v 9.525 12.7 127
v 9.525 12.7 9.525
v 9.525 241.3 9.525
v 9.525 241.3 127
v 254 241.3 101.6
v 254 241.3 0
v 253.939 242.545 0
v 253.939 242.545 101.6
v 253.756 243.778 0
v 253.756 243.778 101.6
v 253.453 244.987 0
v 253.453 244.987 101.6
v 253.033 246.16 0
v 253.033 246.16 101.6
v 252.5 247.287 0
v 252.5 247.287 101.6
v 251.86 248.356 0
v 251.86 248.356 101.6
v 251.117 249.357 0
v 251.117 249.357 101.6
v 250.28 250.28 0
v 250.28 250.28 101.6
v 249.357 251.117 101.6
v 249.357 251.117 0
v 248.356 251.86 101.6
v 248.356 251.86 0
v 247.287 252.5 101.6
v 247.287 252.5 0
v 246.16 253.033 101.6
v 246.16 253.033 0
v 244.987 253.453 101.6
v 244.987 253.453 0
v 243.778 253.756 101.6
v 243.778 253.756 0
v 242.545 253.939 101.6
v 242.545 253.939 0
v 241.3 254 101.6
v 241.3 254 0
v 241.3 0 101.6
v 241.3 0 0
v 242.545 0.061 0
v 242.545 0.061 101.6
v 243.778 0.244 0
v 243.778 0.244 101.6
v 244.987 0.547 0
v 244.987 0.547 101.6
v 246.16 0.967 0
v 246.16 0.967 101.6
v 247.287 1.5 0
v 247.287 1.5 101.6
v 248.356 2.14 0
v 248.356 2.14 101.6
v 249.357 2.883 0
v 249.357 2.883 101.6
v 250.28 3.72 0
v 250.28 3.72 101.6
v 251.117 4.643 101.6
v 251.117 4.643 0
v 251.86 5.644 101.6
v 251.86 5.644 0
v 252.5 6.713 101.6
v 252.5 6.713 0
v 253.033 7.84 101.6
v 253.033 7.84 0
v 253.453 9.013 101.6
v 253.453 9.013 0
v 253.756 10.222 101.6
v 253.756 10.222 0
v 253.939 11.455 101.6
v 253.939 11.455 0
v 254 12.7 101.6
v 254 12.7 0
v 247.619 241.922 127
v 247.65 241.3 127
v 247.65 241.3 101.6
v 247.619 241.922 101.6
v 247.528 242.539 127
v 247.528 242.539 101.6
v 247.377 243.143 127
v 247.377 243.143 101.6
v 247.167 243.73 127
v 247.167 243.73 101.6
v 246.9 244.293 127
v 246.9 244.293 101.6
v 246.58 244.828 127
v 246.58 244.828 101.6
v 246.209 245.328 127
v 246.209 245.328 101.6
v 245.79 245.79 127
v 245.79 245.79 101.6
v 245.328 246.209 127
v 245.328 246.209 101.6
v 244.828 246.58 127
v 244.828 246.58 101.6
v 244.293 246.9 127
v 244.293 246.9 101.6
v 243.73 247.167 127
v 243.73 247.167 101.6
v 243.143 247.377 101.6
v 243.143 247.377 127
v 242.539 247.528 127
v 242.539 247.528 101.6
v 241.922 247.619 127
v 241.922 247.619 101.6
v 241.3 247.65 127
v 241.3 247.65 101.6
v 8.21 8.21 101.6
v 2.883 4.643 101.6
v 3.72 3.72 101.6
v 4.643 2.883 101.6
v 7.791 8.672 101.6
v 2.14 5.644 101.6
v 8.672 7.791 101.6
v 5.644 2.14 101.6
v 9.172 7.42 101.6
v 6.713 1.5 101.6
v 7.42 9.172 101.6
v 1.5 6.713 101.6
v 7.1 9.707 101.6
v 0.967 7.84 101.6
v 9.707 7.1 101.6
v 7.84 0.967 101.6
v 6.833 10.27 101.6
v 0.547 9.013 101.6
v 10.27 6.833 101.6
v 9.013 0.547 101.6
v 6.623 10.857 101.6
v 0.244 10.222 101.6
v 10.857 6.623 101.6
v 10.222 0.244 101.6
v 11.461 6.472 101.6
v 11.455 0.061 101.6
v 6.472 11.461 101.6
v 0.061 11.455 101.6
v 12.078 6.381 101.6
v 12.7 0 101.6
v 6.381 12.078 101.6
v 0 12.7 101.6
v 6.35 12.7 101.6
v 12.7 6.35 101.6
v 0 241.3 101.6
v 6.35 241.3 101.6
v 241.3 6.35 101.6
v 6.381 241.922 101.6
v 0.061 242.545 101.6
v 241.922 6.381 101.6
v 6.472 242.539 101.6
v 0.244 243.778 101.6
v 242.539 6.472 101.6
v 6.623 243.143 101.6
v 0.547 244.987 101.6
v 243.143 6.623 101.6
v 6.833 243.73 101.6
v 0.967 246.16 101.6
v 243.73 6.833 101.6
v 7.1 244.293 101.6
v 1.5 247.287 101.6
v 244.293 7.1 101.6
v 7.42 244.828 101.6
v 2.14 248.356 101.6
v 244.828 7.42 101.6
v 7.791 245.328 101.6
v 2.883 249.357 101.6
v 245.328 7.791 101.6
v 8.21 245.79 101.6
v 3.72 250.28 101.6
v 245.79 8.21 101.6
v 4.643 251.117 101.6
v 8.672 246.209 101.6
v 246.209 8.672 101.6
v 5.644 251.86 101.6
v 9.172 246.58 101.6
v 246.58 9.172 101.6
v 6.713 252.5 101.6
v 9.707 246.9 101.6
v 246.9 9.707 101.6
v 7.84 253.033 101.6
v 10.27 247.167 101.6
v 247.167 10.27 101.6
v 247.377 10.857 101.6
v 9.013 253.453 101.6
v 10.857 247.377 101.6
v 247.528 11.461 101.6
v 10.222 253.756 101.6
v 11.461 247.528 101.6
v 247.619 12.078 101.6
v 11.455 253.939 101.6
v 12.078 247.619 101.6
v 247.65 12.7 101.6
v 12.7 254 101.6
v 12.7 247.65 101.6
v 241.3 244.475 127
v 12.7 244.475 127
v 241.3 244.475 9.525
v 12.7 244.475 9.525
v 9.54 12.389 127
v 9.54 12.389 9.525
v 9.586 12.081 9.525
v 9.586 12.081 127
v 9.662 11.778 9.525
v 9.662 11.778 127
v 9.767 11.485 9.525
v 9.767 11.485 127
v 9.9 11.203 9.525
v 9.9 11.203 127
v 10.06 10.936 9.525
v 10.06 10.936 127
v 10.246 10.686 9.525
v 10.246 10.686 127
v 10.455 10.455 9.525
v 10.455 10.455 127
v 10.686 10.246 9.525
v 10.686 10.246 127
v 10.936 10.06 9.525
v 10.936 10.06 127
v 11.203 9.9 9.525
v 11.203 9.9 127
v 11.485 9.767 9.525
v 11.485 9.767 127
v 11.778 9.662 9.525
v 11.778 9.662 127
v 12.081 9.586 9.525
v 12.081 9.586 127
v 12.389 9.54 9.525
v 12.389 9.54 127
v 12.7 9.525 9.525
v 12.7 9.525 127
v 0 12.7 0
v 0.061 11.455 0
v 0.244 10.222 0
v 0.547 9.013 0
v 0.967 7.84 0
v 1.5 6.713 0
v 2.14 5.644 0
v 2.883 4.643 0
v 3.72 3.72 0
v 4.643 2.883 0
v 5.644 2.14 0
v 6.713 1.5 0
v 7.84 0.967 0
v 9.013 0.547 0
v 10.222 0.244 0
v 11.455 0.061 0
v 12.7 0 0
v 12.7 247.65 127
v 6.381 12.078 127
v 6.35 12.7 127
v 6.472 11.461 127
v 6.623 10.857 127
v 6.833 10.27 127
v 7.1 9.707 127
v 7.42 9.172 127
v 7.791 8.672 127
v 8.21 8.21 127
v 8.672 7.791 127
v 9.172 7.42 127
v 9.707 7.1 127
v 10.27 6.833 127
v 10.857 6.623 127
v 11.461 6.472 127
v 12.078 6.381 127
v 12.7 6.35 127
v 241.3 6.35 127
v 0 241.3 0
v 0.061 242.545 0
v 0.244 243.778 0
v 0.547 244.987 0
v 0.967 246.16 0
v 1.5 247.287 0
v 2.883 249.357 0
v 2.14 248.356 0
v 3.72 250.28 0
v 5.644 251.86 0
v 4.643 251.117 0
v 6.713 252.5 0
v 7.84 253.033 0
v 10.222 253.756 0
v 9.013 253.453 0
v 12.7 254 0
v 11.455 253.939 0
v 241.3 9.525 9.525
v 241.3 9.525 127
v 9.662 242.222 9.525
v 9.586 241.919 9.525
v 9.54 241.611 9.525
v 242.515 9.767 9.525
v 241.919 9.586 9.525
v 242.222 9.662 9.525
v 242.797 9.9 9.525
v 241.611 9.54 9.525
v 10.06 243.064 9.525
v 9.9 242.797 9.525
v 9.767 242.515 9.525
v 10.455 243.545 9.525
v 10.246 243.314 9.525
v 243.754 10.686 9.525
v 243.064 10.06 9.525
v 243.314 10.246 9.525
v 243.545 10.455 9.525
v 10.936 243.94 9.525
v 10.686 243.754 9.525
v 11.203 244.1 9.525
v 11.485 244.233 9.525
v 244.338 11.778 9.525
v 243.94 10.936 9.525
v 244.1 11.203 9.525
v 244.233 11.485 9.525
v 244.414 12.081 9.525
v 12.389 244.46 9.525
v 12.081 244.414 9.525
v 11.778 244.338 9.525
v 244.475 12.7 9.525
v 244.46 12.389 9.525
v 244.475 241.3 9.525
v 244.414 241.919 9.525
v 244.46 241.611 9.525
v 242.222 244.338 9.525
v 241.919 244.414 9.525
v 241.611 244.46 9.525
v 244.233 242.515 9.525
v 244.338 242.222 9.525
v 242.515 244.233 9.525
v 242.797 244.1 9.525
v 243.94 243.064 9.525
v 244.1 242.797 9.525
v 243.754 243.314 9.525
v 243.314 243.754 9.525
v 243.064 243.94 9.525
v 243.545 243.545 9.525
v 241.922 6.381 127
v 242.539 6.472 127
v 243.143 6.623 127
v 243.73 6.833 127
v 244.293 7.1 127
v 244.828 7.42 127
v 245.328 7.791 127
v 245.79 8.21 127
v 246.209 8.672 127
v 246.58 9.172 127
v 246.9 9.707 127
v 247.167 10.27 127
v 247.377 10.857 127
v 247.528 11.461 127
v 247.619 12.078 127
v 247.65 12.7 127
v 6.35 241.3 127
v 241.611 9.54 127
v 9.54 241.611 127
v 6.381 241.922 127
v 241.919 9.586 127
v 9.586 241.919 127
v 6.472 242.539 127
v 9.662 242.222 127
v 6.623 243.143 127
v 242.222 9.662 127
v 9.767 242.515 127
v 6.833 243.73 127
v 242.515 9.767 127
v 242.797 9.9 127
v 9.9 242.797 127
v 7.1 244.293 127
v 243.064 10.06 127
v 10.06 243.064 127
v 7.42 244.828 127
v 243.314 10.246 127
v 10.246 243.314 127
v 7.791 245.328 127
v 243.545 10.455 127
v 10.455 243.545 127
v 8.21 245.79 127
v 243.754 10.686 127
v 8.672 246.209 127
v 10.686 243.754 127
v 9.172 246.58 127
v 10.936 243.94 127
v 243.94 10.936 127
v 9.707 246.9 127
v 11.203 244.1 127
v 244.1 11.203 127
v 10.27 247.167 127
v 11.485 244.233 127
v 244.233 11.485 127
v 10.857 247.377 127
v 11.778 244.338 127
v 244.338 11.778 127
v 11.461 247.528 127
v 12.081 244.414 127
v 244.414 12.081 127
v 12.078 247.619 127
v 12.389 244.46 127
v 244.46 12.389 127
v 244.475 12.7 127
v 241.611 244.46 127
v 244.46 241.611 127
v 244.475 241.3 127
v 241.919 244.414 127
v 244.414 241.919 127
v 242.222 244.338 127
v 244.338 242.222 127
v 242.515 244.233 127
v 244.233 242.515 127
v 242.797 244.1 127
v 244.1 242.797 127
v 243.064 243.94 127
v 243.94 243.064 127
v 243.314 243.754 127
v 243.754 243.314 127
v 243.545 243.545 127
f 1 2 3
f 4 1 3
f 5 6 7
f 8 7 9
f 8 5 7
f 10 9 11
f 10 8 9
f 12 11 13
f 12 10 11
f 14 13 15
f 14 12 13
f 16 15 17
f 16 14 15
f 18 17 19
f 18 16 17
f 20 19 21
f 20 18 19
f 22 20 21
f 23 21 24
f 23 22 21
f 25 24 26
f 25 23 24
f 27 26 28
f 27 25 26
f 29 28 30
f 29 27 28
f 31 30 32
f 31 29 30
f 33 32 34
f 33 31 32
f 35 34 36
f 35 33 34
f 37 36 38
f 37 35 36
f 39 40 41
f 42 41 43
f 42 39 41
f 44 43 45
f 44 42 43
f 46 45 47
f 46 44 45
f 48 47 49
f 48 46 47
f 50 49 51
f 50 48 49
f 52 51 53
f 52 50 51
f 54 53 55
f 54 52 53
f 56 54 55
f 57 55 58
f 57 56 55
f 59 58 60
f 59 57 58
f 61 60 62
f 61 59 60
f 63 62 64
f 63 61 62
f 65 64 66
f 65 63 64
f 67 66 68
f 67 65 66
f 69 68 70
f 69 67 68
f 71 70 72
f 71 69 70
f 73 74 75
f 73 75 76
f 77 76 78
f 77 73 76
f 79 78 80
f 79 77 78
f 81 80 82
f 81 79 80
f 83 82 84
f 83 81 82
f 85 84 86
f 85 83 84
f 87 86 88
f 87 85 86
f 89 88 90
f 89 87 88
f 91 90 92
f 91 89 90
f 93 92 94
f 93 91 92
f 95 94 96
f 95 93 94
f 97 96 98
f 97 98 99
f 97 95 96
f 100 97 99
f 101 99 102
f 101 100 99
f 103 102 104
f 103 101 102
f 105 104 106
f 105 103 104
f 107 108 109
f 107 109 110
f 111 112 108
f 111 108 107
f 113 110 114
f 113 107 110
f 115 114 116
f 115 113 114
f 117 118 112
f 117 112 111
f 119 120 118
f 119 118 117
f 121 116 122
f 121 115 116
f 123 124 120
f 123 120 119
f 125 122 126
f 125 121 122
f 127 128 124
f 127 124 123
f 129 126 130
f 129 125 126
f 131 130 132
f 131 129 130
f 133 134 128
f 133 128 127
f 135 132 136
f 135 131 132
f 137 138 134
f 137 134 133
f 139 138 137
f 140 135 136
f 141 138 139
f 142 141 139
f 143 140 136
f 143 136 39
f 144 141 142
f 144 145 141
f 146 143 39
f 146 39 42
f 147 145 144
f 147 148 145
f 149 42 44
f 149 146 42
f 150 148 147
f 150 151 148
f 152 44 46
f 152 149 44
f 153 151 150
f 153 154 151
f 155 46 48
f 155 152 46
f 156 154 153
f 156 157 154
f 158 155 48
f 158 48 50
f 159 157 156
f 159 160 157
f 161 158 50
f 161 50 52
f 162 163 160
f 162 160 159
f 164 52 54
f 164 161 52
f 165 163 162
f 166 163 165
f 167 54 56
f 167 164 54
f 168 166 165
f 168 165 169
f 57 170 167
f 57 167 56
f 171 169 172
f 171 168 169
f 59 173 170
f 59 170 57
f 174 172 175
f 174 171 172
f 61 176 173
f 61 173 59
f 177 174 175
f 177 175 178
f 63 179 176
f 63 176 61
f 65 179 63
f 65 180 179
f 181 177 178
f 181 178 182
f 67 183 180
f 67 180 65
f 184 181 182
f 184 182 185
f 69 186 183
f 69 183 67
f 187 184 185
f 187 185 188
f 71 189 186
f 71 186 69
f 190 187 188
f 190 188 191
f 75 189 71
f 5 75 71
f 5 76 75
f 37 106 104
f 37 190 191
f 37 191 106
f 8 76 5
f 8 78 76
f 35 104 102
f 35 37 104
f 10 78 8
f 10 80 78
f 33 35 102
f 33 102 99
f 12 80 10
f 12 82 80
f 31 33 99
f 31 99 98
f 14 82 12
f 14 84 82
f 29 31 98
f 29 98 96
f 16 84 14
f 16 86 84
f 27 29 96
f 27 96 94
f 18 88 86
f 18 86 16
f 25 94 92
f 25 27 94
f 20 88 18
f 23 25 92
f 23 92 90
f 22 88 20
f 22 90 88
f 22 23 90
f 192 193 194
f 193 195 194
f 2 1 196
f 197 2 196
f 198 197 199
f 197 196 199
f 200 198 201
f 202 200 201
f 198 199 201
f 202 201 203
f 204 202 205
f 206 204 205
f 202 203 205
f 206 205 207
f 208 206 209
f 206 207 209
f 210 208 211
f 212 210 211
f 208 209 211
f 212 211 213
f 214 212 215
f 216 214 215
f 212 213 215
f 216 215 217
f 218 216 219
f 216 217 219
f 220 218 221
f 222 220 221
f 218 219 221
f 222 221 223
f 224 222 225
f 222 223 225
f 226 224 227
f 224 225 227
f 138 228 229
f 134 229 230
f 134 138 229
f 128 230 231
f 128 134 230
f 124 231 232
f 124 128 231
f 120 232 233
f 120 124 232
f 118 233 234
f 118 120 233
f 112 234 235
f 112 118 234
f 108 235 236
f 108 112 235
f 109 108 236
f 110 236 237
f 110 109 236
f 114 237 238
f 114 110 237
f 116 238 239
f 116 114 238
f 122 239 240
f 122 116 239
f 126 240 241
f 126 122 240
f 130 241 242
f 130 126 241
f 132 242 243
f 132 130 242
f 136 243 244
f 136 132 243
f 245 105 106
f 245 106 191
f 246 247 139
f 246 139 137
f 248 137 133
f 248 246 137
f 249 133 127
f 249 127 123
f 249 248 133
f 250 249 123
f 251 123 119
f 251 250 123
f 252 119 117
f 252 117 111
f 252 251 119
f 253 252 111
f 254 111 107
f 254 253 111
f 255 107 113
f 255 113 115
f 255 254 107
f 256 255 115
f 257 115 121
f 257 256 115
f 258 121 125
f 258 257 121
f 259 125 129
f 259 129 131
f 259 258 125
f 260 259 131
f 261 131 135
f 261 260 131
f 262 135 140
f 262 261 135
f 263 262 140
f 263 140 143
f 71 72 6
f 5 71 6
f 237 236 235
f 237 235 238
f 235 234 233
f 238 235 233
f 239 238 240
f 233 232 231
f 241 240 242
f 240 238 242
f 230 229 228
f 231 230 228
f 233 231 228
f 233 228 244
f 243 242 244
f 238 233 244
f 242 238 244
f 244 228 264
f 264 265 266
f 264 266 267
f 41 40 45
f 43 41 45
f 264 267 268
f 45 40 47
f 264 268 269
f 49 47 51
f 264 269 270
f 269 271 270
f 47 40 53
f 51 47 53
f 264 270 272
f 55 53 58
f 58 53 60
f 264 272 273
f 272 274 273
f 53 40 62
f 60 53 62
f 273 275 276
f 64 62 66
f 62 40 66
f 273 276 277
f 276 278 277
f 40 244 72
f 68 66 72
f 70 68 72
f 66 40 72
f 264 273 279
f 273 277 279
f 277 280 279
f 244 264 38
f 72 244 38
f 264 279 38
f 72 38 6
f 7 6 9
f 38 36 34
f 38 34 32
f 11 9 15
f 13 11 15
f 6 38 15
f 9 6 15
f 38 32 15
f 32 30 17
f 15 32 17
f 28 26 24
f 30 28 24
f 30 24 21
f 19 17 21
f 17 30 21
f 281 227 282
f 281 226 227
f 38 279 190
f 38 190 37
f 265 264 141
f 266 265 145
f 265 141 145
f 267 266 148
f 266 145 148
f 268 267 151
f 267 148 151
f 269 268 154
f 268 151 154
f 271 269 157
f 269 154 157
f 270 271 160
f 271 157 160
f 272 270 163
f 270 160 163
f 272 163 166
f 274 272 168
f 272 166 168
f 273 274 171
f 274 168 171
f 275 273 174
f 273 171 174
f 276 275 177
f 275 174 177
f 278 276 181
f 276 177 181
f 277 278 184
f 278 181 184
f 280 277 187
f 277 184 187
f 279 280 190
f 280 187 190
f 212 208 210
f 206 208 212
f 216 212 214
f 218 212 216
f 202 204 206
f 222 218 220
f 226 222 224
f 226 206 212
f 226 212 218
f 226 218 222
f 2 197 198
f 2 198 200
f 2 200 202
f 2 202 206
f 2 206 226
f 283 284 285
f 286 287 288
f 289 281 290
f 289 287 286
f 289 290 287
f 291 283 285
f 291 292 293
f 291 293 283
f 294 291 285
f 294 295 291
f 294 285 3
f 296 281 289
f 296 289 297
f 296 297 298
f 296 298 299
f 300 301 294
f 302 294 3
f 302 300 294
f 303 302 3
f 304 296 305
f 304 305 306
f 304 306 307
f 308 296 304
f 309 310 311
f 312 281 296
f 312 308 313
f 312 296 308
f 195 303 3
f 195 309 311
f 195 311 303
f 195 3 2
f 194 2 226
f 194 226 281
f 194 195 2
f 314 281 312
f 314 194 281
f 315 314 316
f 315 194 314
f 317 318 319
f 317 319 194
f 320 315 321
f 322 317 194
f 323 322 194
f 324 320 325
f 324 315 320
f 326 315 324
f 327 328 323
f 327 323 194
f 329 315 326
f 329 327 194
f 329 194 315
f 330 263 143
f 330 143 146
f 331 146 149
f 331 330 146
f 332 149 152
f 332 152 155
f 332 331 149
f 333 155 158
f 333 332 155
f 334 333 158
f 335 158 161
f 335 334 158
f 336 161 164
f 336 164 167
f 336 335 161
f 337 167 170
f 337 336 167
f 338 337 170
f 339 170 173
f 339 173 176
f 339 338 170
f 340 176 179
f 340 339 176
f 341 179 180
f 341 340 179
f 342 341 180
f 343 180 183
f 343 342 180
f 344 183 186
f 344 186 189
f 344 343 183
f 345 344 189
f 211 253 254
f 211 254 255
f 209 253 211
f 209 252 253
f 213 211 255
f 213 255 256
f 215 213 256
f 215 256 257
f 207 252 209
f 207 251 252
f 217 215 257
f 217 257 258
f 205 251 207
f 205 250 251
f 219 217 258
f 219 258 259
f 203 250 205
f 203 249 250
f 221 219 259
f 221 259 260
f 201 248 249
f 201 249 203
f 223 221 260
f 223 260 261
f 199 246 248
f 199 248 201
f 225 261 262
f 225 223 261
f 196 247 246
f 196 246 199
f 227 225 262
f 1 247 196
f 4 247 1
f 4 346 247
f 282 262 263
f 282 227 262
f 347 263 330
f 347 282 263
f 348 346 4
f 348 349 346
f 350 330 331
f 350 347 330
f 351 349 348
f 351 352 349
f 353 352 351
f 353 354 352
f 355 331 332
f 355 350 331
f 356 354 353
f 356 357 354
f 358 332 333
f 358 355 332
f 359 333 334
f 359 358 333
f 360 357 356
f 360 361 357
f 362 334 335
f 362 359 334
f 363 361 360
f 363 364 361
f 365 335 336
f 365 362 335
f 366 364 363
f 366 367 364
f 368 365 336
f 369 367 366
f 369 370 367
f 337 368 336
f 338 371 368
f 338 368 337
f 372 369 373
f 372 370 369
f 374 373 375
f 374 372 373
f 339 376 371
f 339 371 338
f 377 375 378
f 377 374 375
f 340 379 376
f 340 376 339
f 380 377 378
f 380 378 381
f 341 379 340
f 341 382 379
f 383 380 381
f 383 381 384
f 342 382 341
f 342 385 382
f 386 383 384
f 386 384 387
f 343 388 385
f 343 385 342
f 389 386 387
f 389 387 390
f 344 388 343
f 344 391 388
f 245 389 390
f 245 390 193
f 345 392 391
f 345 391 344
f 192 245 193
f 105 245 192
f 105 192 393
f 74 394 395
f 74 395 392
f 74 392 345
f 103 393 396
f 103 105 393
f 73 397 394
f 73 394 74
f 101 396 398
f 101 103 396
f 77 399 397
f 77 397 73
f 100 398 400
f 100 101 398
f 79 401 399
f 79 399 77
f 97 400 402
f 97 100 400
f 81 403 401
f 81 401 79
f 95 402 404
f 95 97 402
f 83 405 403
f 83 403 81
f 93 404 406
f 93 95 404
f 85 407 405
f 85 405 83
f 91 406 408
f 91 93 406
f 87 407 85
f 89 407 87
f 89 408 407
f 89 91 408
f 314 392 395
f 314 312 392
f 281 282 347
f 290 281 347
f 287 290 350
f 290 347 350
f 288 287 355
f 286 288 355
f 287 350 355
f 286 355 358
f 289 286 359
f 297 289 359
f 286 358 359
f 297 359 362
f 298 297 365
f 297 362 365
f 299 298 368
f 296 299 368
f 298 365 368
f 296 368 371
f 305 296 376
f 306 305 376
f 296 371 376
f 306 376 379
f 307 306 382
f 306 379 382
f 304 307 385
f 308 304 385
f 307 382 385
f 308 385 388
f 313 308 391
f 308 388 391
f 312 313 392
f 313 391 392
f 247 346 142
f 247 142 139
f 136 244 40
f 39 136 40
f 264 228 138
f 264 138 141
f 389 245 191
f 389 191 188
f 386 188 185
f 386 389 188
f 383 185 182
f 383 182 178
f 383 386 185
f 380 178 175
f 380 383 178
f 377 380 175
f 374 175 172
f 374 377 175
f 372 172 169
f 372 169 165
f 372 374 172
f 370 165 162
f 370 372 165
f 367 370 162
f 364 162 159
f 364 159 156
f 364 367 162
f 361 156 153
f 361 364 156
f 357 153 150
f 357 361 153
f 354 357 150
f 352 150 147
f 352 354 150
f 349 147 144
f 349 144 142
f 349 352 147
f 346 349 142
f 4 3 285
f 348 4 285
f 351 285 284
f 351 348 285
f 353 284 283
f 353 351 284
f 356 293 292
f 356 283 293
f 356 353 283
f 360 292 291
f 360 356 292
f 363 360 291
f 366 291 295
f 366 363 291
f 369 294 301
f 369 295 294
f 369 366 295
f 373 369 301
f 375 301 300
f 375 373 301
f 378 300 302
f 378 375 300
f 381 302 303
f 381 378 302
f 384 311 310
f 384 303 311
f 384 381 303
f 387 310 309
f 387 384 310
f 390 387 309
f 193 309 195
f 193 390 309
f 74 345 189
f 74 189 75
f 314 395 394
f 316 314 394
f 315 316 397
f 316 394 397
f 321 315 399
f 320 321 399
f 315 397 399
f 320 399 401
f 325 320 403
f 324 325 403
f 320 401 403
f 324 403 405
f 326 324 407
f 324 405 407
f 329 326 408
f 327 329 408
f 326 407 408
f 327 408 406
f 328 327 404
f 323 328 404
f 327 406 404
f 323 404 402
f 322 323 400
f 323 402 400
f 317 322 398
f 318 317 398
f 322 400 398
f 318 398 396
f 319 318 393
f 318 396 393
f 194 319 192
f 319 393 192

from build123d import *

# Parameters (mm, degrees)
SKETCH2_W          = 254
SKETCH2_H          = 254
EXTRUDE1_DEPTH     = 127
FILLET1_R          = 12.7
SHELL1_T           = -9.525
CUT_EXTRUDE1_DEPTH = 25.4


with BuildPart() as part:
    # Sketch2 → Extrude1 (new body)
    with BuildSketch(Plane.XY):
        with Locations((127, 127)):
            Rectangle(SKETCH2_W, SKETCH2_H)
    extrude(amount=EXTRUDE1_DEPTH)

    # Fillet1
    fillet1_edges = [part.edges().sort_by_distance(p)[0] for p in [
        (0, 254, 63.5),
        (254, 254, 63.5),
        (254, 0, 63.5),
        (0, 0, 63.5),
    ]]
    fillet(fillet1_edges, radius=FILLET1_R)

    # Shell1
    shell1_openings = [part.faces().sort_by_distance(p)[0] for p in [
        (127, 127, 127),
    ]]
    offset(amount=SHELL1_T, openings=shell1_openings, kind=Kind.INTERSECTION)

    # Sketch3 → Cut-Extrude1 (cut)
    with BuildSketch(Plane.XY.offset(127)):
        with BuildLine():
            Line((0, 241.3), (0, 12.7))
            ThreePointArc((0, 12.7), (3.719743879, 3.719743879), (12.7, 0))
            Line((12.7, 0), (241.3, 0))
            ThreePointArc((241.3, 0), (250.280256121, 3.719743879), (254, 12.7))
            Line((254, 12.7), (254, 241.3))
            ThreePointArc((254, 241.3), (250.280256121, 250.280256121), (241.3, 254))
            Line((241.3, 254), (12.7, 254))
            ThreePointArc((12.7, 254), (3.719743879, 250.280256121), (0, 241.3))
        make_face()
        with BuildLine():
            Line((6.35, 241.3), (6.35, 12.7))
            ThreePointArc((6.35, 12.7), (8.209871939, 8.209871939), (12.7, 6.35))
            Line((12.7, 6.35), (241.3, 6.35))
            ThreePointArc((241.3, 6.35), (245.790128061, 8.209871939), (247.65, 12.7))
            Line((247.65, 12.7), (247.65, 241.3))
            ThreePointArc((247.65, 241.3), (245.790128061, 245.790128061), (241.3, 247.65))
            Line((241.3, 247.65), (12.7, 247.65))
            ThreePointArc((12.7, 247.65), (8.209871939, 245.790128061), (6.35, 241.3))
        make_face(mode=Mode.SUBTRACT)
    extrude(amount=-CUT_EXTRUDE1_DEPTH, mode=Mode.SUBTRACT)


solid = part.part
